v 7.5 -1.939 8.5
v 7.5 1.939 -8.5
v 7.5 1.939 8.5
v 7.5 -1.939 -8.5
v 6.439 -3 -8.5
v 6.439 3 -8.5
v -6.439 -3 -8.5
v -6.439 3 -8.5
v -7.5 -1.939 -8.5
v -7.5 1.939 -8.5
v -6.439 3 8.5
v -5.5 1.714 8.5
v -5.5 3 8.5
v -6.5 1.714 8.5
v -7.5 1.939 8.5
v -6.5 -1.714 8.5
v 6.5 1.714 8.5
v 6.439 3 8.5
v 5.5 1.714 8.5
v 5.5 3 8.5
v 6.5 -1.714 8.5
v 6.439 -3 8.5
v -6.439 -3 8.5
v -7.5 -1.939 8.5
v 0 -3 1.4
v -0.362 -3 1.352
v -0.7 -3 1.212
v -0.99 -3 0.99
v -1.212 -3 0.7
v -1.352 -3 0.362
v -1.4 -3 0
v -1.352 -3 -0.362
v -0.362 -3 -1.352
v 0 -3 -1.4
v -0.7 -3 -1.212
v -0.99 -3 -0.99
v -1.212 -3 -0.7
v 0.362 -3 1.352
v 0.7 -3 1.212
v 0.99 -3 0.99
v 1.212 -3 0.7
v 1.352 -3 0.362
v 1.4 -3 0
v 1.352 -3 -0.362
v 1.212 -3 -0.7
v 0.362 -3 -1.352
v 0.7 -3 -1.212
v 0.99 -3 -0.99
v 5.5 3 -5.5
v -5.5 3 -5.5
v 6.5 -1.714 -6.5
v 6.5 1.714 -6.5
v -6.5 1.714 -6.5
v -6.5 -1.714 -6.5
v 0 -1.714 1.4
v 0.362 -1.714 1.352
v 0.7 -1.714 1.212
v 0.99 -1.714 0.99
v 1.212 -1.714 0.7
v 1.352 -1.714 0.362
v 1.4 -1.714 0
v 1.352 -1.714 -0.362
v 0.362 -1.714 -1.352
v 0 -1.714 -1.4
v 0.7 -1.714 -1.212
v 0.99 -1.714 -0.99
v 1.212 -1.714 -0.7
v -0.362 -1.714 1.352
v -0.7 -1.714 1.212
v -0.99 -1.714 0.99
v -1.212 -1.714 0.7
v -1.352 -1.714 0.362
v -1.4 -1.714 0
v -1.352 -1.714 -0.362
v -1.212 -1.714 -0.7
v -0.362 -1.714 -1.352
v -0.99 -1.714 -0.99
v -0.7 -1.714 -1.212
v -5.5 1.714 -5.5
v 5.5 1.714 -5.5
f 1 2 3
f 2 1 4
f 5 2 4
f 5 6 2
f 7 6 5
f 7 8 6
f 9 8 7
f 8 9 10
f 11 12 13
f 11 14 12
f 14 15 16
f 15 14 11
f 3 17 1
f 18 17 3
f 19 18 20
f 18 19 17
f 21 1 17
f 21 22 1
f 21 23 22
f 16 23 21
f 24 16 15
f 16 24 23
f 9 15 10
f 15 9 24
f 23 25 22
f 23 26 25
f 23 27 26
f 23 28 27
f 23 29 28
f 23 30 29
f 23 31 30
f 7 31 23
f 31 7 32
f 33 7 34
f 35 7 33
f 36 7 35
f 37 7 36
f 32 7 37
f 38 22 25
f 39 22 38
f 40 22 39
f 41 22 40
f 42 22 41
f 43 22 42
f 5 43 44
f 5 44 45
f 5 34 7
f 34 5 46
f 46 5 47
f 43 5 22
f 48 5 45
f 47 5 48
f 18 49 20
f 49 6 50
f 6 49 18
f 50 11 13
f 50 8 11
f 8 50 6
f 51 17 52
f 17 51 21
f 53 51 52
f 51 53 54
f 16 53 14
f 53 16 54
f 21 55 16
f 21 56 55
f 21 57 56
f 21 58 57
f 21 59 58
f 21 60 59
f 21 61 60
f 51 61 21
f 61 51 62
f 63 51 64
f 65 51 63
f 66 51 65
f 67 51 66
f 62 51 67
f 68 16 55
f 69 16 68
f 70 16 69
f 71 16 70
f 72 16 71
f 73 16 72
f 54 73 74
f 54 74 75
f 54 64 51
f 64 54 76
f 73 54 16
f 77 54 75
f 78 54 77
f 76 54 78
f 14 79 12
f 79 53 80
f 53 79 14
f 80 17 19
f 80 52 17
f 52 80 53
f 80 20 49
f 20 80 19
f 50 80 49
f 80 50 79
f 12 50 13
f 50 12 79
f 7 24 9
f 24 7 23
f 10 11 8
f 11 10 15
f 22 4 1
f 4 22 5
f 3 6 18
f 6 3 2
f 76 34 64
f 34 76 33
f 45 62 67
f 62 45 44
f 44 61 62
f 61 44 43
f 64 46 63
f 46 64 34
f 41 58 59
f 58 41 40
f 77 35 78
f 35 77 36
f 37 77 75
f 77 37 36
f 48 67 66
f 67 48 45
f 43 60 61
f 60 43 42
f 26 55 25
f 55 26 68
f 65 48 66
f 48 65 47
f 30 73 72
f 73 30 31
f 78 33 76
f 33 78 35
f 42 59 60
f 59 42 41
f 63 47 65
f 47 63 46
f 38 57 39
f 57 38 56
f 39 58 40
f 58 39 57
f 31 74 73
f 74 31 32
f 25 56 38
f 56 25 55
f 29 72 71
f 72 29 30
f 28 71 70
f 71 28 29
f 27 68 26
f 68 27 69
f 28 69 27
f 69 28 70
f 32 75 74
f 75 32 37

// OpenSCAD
module clip(lgt,wid,hgt,rad) {
   difference() {
     cube([lgt,wid,hgt],center=true);
     translate([0,0,-2])
             cube([lgt-2,4*wid/7,hgt],center=true);
     translate([0,-wid/2,-3])
             cube([lgt-4,wid,hgt],center=true);

      translate([-lgt/2,wid/2,0])
         rotate([0,0,45])
           cube([lgt,wid/4,hgt+2],            center=true);
        translate([-lgt/2,-wid/2,0])
         rotate([0,0,-45])
           cube([lgt,wid/4,hgt+2],            center=true);
        translate([lgt/2,wid/2,0])
         rotate([0,0,-45])
           cube([lgt,wid/4,hgt+2],            center=true);
        translate([lgt/2,-wid/2,0])
         rotate([0,0,45])
           cube([lgt,wid/4,hgt+2],            center=true);
       rotate([90,0,0])
            cylinder(r=rad,h=10,center=true, $fn=24);
   }

}

rotate([180,0,0]) clip(15,6,17,1.4);
